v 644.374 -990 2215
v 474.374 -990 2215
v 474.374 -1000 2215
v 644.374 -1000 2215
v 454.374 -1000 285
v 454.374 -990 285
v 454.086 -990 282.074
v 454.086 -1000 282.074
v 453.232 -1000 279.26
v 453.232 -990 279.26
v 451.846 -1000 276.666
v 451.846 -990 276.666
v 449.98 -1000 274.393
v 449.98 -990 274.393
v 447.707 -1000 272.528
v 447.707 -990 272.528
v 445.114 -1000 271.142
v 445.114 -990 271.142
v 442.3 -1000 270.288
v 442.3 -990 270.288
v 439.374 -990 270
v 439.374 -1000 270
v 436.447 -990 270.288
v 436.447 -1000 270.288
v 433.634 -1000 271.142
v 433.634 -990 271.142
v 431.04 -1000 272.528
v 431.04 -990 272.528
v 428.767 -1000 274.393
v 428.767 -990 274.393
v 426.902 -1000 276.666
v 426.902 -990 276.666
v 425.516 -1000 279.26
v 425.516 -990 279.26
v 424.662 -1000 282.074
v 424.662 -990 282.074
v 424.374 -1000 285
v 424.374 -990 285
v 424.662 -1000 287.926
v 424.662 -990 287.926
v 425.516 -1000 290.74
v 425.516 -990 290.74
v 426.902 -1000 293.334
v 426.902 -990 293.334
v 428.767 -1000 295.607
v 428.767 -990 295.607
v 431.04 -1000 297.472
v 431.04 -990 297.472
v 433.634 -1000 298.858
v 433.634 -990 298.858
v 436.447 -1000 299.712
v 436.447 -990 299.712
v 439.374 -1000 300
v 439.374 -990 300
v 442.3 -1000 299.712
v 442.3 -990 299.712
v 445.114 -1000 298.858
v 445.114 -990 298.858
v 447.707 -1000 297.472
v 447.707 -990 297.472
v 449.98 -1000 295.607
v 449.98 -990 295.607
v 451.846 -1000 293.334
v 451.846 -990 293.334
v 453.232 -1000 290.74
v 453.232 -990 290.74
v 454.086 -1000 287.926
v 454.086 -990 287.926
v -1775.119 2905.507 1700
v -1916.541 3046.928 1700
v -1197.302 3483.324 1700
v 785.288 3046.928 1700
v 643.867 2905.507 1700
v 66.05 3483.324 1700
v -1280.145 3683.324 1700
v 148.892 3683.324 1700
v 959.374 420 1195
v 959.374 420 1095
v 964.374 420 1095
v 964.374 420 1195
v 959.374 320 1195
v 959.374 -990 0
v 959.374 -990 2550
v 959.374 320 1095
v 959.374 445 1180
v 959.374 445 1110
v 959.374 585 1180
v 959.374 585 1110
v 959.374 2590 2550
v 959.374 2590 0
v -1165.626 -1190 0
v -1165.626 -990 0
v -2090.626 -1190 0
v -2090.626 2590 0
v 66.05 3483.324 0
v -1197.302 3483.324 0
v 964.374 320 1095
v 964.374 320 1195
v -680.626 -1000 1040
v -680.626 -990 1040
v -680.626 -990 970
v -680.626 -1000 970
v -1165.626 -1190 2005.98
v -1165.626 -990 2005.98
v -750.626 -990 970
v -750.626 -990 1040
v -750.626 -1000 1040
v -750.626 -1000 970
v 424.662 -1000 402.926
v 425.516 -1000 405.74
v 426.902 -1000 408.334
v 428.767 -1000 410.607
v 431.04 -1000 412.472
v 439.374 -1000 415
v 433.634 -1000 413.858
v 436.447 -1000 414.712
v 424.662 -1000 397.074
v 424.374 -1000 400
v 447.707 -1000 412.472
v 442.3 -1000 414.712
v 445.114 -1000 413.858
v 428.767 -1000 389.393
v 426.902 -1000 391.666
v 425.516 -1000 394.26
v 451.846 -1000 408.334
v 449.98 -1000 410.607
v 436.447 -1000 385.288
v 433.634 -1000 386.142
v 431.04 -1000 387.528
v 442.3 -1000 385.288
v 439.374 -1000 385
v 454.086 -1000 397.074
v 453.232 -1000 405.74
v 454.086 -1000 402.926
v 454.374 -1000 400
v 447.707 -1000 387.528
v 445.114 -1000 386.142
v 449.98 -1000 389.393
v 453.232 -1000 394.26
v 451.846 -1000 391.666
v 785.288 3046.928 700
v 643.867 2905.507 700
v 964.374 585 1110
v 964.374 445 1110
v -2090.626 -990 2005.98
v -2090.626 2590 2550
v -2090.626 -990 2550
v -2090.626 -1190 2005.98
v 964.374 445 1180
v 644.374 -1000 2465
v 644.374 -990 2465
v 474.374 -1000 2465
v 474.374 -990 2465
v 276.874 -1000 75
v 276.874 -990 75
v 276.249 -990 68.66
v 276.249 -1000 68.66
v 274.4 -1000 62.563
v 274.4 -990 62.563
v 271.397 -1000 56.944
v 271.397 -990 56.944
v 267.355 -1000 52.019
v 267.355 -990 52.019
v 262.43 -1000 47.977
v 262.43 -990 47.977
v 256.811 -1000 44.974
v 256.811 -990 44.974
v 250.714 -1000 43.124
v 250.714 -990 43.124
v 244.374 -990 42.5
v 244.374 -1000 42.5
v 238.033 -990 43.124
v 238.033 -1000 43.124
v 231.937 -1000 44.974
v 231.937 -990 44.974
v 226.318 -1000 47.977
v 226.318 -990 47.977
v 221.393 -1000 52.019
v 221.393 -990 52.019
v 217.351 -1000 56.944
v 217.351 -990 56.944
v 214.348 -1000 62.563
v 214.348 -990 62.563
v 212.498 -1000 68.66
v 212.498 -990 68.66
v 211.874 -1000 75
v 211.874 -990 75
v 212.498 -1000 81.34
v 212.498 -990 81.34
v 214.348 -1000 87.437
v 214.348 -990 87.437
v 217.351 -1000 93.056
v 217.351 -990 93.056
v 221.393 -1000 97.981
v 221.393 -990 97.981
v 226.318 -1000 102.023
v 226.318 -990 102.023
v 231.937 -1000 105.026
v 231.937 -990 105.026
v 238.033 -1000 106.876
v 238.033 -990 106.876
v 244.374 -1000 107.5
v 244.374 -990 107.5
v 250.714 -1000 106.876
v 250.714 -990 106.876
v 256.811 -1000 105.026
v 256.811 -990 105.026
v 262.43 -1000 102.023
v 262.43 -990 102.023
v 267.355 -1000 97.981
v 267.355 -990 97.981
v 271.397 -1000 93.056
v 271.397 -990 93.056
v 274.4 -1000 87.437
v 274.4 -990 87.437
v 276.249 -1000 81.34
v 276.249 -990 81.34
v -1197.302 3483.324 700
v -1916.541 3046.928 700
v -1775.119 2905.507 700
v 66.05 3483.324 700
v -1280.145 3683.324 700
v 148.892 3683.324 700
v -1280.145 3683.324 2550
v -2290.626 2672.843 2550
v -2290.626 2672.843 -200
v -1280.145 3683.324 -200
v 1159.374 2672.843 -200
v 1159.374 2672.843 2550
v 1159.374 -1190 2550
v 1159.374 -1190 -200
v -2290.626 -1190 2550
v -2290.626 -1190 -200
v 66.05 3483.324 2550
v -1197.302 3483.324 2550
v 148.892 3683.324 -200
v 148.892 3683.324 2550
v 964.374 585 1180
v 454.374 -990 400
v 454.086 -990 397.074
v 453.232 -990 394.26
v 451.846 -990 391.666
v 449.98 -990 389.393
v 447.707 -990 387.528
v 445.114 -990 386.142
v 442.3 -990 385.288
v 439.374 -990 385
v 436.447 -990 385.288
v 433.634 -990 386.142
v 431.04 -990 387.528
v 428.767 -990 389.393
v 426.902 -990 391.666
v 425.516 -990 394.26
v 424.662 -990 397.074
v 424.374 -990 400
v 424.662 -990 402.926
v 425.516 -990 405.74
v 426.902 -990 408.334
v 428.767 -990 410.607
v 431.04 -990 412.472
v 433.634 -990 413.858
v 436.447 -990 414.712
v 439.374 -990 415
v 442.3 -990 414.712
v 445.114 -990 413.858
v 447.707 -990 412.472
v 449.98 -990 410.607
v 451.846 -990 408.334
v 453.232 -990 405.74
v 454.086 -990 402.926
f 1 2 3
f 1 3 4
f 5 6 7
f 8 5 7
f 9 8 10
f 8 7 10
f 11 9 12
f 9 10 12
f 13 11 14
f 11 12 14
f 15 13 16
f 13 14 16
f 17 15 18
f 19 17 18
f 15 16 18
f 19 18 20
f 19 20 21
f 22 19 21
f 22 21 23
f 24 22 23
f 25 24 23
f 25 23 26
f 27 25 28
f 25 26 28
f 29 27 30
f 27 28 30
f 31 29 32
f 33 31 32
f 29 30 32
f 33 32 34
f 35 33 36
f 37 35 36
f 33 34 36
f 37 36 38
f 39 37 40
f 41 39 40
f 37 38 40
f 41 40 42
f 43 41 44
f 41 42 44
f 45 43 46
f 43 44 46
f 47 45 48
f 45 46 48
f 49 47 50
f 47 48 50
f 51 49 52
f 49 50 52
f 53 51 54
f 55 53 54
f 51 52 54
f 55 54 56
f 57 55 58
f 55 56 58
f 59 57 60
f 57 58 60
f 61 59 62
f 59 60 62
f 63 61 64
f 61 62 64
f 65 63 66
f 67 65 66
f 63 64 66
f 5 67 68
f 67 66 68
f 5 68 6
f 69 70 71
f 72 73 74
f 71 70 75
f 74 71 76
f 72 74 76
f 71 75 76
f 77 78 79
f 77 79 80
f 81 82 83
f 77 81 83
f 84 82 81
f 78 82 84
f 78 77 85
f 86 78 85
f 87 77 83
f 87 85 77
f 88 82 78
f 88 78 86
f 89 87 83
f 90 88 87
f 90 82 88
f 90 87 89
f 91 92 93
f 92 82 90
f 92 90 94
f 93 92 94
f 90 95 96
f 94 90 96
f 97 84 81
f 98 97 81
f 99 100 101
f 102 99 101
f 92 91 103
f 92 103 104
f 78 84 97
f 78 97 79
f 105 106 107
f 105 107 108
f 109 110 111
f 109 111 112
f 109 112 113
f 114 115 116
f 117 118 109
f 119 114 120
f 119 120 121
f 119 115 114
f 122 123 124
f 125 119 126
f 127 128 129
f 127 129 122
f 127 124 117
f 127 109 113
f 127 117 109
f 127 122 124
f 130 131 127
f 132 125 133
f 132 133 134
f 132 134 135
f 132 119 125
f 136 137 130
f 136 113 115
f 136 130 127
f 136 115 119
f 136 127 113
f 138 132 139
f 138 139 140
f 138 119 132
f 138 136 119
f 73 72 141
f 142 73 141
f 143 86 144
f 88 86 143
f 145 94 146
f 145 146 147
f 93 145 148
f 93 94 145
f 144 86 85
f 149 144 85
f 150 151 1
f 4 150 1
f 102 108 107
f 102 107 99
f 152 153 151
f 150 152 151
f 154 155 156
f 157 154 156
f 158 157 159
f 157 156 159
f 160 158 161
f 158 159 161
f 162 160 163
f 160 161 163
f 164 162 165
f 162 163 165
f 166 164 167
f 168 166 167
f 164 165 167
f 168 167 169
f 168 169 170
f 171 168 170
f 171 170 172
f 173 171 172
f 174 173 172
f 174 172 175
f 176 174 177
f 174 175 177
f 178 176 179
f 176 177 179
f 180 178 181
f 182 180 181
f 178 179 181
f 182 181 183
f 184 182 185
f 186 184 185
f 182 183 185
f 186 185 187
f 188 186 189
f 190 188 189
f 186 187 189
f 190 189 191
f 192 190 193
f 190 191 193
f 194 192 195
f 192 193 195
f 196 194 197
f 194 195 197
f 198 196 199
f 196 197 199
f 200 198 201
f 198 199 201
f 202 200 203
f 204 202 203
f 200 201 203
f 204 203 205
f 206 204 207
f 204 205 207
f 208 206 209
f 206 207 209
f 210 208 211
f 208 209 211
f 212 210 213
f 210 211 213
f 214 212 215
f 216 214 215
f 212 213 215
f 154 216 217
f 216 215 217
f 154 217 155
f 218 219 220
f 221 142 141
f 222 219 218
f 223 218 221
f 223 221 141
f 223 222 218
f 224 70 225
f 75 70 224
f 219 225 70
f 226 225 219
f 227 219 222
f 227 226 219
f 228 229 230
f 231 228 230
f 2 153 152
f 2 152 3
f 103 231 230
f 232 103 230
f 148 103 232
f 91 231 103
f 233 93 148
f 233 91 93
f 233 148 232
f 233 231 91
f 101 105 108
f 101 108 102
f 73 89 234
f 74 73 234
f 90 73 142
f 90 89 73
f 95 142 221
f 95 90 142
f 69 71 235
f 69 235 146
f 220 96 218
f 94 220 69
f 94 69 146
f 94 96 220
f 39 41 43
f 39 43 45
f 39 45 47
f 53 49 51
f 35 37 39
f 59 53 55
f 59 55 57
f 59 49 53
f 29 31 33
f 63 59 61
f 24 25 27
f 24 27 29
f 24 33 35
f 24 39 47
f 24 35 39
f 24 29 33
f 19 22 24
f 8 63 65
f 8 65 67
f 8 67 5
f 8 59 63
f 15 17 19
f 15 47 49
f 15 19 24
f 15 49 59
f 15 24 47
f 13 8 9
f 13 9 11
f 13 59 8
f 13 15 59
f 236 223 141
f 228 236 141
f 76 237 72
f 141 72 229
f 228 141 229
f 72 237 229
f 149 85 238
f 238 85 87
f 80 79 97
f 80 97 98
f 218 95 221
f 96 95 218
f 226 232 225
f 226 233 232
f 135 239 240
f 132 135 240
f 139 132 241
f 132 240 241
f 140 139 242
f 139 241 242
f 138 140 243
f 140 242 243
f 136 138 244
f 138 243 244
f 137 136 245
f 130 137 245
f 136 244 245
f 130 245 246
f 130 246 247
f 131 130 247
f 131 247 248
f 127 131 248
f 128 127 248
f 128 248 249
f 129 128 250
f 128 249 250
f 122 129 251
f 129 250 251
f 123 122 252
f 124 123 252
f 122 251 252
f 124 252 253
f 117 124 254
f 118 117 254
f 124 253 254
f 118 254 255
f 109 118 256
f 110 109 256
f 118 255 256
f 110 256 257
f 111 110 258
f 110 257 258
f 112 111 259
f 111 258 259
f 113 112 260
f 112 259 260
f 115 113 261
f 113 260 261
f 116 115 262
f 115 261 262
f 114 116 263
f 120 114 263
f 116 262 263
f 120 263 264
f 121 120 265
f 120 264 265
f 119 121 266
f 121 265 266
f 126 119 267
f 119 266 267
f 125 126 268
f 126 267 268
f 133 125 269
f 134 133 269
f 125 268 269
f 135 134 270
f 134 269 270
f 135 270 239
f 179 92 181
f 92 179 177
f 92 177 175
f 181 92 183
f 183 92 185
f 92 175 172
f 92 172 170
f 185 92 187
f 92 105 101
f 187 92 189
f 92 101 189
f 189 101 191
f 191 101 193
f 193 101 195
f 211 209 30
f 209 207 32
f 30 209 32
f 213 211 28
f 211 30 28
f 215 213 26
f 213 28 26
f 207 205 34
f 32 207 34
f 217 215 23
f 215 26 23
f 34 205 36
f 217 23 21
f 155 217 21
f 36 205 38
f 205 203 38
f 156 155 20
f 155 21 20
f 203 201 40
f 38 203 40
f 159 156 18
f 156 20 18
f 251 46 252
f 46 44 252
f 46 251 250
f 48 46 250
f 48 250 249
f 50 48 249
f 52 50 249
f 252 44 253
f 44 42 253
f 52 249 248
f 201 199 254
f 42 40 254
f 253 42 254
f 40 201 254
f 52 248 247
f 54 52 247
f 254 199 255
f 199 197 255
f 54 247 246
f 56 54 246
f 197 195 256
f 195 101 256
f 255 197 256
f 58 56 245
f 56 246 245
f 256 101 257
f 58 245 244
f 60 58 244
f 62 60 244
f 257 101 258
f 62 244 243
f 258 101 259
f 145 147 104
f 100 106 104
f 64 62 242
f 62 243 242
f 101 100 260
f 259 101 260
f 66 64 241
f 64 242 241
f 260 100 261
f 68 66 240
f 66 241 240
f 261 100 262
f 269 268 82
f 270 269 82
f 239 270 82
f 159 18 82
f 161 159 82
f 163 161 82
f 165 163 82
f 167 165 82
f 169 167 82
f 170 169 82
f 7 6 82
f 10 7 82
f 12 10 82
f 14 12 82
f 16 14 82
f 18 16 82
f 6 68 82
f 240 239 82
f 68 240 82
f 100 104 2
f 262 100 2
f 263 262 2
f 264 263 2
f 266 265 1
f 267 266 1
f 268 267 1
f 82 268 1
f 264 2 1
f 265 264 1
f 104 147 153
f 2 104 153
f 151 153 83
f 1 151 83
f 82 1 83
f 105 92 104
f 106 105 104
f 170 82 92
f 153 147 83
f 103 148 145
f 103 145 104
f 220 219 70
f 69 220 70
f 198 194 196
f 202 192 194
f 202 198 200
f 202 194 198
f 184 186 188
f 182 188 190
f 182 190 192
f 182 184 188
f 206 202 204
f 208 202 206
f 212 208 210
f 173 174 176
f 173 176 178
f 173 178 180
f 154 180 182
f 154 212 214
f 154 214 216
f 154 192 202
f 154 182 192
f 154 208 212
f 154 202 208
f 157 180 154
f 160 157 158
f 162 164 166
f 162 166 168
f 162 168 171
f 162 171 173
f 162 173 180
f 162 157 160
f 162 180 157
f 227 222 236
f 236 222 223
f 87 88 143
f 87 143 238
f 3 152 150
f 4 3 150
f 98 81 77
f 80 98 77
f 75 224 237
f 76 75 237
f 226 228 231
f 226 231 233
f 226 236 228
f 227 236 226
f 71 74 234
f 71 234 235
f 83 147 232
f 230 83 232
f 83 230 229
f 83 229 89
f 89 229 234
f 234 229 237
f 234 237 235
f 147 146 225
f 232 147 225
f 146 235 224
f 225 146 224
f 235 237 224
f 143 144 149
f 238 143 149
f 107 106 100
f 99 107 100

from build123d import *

# Parameters (mm, degrees)
BASE_DEPTH           = 2550
FLOOR_2_DEPTH        = 200
SKETCH13_W           = 1000
SKETCH13_H           = 900
WINDOW_RIGHT_DEPTH   = 5171.960671741
SKETCH14_W           = 1429.036790187
SKETCH14_H           = 1000
WINDOW_CENTER_DEPTH  = 500
SKETCH8_W            = 170
SKETCH8_H            = 250
VENTILATION_DEPTH    = 10
SKETCH9_R            = 15
SKETCH9_R_2          = 32.5
SKETCH9_W            = 70
SKETCH9_H            = 70
SOCKET_PIPES_DEPTH   = 10
SKETCH10_W           = 100
SKETCH10_H           = 100
SKETCH10_W_2         = 70
SKETCH10_H_2         = 140
SOCKET_DEPTH         = 5
SKETCH12_W           = 1072.28008248
SKETCH12_H           = 544.020295296
DOOR_HIGH_WALL_DEPTH = 200
WALL_DEPTH           = 2550
SKETCH15_W           = 1000
SKETCH15_H           = 900
WINDOW_LEFT_DEPTH    = 500


with BuildPart() as part:
    # Sketch1 → Base (new body)
    with BuildSketch(Plane.XY):
        Polygon((959.373842867, -990), (959.373842867, 2590), (66.049525486, 3483.324317381), (-1197.301839752, 3483.324317381), (-1280.144552227, 3683.324317381), (148.89223796, 3683.324317381), (1159.373842867, 2672.842712475), (1159.373842867, -1190), (-1165.626157133, -1190), (-1165.626157133, -990), align=None)
    extrude(amount=BASE_DEPTH)

    # Sketch5 → Floor 2 (add)
    with BuildSketch(Plane.XY):
        Polygon((1159.373842867, 2672.842712475), (1159.373842867, -1190), (-2290.626157133, -1190), (-2290.626157133, 2672.842712475), (-1280.144552227, 3683.324317381), (148.89223796, 3683.324317381), align=None)
    extrude(amount=-FLOOR_2_DEPTH)

    # Sketch13 → Window right (cut, through all)
    with BuildSketch(Plane(origin=(1916.108277671, 1916.108277671, 0), x_dir=(0, 0, -1), z_dir=(0.707106781, 0.707106781, 0))):
        with Locations((-1200, 2049.220891002)):
            Rectangle(SKETCH13_W, SKETCH13_H)
    extrude(amount=-WINDOW_RIGHT_DEPTH, mode=Mode.SUBTRACT)

    # Sketch14 → Window center (cut)
    with BuildSketch(Plane(origin=(0, 3683.324317381, 0), x_dir=(1, 0, 0), z_dir=(0, 1, 0))):
        with Locations((-565.626157133, -1200)):
            Rectangle(SKETCH14_W, SKETCH14_H)
    extrude(amount=-WINDOW_CENTER_DEPTH, mode=Mode.SUBTRACT)

    # Sketch8 → Ventilation (cut)
    with BuildSketch(Plane(origin=(0, -990, 0), x_dir=(1, 0, 0), z_dir=(0, 1, 0))):
        with Locations((559.373842867, -2340)):
            Rectangle(SKETCH8_W, SKETCH8_H)
    extrude(amount=-VENTILATION_DEPTH, mode=Mode.SUBTRACT)

    # Sketch9 → Socket & pipes (cut)
    with BuildSketch(Plane(origin=(0, -990, 0), x_dir=(1, 0, 0), z_dir=(0, 1, 0))):
        with Locations((439.373842867, -400)):
            Circle(SKETCH9_R)
        with Locations((439.373842867, -285)):
            Circle(SKETCH9_R)
        with Locations((244.373842867, -75)):
            Circle(SKETCH9_R_2)
        with Locations((-715.626157133, -1005)):
            Rectangle(SKETCH9_W, SKETCH9_H)
    extrude(amount=-SOCKET_PIPES_DEPTH, mode=Mode.SUBTRACT)

    # Sketch10 → Socket (cut)
    with BuildSketch(Plane.ZY.offset(-959.373842867)):
        with Locations((1145, 370)):
            Rectangle(SKETCH10_W, SKETCH10_H)
        with Locations((1145, 515)):
            Rectangle(SKETCH10_W_2, SKETCH10_H_2)
    extrude(amount=-SOCKET_DEPTH, mode=Mode.SUBTRACT)

    # Sketch12 → Door high wall (add)
    with BuildSketch(Plane.XZ.offset(1190)):
        with Locations((-1701.766198373, 2277.989852352)):
            Rectangle(SKETCH12_W, SKETCH12_H)
    extrude(amount=-DOOR_HIGH_WALL_DEPTH)

    # Sketch6 → Wall (add)
    with BuildSketch(Plane.XY):
        Polygon((-1280.144552227, 3683.324317381), (-1197.301839752, 3483.324317381), (-2090.626157133, 2590), (-2090.626157133, -1190), (-2290.626157133, -1190), (-2290.626157133, 2672.842712475), align=None)
    extrude(amount=WALL_DEPTH)

    # Sketch15 → Window left (cut)
    with BuildSketch(Plane(origin=(-2481.734434804, 2481.734434804, 0), x_dir=(0, 0, 1), z_dir=(-0.707106781, 0.707106781, 0))):
        with Locations((1200, 1249.304708351)):
            Rectangle(SKETCH15_W, SKETCH15_H)
    extrude(amount=-WINDOW_LEFT_DEPTH, mode=Mode.SUBTRACT)


solid = part.part
